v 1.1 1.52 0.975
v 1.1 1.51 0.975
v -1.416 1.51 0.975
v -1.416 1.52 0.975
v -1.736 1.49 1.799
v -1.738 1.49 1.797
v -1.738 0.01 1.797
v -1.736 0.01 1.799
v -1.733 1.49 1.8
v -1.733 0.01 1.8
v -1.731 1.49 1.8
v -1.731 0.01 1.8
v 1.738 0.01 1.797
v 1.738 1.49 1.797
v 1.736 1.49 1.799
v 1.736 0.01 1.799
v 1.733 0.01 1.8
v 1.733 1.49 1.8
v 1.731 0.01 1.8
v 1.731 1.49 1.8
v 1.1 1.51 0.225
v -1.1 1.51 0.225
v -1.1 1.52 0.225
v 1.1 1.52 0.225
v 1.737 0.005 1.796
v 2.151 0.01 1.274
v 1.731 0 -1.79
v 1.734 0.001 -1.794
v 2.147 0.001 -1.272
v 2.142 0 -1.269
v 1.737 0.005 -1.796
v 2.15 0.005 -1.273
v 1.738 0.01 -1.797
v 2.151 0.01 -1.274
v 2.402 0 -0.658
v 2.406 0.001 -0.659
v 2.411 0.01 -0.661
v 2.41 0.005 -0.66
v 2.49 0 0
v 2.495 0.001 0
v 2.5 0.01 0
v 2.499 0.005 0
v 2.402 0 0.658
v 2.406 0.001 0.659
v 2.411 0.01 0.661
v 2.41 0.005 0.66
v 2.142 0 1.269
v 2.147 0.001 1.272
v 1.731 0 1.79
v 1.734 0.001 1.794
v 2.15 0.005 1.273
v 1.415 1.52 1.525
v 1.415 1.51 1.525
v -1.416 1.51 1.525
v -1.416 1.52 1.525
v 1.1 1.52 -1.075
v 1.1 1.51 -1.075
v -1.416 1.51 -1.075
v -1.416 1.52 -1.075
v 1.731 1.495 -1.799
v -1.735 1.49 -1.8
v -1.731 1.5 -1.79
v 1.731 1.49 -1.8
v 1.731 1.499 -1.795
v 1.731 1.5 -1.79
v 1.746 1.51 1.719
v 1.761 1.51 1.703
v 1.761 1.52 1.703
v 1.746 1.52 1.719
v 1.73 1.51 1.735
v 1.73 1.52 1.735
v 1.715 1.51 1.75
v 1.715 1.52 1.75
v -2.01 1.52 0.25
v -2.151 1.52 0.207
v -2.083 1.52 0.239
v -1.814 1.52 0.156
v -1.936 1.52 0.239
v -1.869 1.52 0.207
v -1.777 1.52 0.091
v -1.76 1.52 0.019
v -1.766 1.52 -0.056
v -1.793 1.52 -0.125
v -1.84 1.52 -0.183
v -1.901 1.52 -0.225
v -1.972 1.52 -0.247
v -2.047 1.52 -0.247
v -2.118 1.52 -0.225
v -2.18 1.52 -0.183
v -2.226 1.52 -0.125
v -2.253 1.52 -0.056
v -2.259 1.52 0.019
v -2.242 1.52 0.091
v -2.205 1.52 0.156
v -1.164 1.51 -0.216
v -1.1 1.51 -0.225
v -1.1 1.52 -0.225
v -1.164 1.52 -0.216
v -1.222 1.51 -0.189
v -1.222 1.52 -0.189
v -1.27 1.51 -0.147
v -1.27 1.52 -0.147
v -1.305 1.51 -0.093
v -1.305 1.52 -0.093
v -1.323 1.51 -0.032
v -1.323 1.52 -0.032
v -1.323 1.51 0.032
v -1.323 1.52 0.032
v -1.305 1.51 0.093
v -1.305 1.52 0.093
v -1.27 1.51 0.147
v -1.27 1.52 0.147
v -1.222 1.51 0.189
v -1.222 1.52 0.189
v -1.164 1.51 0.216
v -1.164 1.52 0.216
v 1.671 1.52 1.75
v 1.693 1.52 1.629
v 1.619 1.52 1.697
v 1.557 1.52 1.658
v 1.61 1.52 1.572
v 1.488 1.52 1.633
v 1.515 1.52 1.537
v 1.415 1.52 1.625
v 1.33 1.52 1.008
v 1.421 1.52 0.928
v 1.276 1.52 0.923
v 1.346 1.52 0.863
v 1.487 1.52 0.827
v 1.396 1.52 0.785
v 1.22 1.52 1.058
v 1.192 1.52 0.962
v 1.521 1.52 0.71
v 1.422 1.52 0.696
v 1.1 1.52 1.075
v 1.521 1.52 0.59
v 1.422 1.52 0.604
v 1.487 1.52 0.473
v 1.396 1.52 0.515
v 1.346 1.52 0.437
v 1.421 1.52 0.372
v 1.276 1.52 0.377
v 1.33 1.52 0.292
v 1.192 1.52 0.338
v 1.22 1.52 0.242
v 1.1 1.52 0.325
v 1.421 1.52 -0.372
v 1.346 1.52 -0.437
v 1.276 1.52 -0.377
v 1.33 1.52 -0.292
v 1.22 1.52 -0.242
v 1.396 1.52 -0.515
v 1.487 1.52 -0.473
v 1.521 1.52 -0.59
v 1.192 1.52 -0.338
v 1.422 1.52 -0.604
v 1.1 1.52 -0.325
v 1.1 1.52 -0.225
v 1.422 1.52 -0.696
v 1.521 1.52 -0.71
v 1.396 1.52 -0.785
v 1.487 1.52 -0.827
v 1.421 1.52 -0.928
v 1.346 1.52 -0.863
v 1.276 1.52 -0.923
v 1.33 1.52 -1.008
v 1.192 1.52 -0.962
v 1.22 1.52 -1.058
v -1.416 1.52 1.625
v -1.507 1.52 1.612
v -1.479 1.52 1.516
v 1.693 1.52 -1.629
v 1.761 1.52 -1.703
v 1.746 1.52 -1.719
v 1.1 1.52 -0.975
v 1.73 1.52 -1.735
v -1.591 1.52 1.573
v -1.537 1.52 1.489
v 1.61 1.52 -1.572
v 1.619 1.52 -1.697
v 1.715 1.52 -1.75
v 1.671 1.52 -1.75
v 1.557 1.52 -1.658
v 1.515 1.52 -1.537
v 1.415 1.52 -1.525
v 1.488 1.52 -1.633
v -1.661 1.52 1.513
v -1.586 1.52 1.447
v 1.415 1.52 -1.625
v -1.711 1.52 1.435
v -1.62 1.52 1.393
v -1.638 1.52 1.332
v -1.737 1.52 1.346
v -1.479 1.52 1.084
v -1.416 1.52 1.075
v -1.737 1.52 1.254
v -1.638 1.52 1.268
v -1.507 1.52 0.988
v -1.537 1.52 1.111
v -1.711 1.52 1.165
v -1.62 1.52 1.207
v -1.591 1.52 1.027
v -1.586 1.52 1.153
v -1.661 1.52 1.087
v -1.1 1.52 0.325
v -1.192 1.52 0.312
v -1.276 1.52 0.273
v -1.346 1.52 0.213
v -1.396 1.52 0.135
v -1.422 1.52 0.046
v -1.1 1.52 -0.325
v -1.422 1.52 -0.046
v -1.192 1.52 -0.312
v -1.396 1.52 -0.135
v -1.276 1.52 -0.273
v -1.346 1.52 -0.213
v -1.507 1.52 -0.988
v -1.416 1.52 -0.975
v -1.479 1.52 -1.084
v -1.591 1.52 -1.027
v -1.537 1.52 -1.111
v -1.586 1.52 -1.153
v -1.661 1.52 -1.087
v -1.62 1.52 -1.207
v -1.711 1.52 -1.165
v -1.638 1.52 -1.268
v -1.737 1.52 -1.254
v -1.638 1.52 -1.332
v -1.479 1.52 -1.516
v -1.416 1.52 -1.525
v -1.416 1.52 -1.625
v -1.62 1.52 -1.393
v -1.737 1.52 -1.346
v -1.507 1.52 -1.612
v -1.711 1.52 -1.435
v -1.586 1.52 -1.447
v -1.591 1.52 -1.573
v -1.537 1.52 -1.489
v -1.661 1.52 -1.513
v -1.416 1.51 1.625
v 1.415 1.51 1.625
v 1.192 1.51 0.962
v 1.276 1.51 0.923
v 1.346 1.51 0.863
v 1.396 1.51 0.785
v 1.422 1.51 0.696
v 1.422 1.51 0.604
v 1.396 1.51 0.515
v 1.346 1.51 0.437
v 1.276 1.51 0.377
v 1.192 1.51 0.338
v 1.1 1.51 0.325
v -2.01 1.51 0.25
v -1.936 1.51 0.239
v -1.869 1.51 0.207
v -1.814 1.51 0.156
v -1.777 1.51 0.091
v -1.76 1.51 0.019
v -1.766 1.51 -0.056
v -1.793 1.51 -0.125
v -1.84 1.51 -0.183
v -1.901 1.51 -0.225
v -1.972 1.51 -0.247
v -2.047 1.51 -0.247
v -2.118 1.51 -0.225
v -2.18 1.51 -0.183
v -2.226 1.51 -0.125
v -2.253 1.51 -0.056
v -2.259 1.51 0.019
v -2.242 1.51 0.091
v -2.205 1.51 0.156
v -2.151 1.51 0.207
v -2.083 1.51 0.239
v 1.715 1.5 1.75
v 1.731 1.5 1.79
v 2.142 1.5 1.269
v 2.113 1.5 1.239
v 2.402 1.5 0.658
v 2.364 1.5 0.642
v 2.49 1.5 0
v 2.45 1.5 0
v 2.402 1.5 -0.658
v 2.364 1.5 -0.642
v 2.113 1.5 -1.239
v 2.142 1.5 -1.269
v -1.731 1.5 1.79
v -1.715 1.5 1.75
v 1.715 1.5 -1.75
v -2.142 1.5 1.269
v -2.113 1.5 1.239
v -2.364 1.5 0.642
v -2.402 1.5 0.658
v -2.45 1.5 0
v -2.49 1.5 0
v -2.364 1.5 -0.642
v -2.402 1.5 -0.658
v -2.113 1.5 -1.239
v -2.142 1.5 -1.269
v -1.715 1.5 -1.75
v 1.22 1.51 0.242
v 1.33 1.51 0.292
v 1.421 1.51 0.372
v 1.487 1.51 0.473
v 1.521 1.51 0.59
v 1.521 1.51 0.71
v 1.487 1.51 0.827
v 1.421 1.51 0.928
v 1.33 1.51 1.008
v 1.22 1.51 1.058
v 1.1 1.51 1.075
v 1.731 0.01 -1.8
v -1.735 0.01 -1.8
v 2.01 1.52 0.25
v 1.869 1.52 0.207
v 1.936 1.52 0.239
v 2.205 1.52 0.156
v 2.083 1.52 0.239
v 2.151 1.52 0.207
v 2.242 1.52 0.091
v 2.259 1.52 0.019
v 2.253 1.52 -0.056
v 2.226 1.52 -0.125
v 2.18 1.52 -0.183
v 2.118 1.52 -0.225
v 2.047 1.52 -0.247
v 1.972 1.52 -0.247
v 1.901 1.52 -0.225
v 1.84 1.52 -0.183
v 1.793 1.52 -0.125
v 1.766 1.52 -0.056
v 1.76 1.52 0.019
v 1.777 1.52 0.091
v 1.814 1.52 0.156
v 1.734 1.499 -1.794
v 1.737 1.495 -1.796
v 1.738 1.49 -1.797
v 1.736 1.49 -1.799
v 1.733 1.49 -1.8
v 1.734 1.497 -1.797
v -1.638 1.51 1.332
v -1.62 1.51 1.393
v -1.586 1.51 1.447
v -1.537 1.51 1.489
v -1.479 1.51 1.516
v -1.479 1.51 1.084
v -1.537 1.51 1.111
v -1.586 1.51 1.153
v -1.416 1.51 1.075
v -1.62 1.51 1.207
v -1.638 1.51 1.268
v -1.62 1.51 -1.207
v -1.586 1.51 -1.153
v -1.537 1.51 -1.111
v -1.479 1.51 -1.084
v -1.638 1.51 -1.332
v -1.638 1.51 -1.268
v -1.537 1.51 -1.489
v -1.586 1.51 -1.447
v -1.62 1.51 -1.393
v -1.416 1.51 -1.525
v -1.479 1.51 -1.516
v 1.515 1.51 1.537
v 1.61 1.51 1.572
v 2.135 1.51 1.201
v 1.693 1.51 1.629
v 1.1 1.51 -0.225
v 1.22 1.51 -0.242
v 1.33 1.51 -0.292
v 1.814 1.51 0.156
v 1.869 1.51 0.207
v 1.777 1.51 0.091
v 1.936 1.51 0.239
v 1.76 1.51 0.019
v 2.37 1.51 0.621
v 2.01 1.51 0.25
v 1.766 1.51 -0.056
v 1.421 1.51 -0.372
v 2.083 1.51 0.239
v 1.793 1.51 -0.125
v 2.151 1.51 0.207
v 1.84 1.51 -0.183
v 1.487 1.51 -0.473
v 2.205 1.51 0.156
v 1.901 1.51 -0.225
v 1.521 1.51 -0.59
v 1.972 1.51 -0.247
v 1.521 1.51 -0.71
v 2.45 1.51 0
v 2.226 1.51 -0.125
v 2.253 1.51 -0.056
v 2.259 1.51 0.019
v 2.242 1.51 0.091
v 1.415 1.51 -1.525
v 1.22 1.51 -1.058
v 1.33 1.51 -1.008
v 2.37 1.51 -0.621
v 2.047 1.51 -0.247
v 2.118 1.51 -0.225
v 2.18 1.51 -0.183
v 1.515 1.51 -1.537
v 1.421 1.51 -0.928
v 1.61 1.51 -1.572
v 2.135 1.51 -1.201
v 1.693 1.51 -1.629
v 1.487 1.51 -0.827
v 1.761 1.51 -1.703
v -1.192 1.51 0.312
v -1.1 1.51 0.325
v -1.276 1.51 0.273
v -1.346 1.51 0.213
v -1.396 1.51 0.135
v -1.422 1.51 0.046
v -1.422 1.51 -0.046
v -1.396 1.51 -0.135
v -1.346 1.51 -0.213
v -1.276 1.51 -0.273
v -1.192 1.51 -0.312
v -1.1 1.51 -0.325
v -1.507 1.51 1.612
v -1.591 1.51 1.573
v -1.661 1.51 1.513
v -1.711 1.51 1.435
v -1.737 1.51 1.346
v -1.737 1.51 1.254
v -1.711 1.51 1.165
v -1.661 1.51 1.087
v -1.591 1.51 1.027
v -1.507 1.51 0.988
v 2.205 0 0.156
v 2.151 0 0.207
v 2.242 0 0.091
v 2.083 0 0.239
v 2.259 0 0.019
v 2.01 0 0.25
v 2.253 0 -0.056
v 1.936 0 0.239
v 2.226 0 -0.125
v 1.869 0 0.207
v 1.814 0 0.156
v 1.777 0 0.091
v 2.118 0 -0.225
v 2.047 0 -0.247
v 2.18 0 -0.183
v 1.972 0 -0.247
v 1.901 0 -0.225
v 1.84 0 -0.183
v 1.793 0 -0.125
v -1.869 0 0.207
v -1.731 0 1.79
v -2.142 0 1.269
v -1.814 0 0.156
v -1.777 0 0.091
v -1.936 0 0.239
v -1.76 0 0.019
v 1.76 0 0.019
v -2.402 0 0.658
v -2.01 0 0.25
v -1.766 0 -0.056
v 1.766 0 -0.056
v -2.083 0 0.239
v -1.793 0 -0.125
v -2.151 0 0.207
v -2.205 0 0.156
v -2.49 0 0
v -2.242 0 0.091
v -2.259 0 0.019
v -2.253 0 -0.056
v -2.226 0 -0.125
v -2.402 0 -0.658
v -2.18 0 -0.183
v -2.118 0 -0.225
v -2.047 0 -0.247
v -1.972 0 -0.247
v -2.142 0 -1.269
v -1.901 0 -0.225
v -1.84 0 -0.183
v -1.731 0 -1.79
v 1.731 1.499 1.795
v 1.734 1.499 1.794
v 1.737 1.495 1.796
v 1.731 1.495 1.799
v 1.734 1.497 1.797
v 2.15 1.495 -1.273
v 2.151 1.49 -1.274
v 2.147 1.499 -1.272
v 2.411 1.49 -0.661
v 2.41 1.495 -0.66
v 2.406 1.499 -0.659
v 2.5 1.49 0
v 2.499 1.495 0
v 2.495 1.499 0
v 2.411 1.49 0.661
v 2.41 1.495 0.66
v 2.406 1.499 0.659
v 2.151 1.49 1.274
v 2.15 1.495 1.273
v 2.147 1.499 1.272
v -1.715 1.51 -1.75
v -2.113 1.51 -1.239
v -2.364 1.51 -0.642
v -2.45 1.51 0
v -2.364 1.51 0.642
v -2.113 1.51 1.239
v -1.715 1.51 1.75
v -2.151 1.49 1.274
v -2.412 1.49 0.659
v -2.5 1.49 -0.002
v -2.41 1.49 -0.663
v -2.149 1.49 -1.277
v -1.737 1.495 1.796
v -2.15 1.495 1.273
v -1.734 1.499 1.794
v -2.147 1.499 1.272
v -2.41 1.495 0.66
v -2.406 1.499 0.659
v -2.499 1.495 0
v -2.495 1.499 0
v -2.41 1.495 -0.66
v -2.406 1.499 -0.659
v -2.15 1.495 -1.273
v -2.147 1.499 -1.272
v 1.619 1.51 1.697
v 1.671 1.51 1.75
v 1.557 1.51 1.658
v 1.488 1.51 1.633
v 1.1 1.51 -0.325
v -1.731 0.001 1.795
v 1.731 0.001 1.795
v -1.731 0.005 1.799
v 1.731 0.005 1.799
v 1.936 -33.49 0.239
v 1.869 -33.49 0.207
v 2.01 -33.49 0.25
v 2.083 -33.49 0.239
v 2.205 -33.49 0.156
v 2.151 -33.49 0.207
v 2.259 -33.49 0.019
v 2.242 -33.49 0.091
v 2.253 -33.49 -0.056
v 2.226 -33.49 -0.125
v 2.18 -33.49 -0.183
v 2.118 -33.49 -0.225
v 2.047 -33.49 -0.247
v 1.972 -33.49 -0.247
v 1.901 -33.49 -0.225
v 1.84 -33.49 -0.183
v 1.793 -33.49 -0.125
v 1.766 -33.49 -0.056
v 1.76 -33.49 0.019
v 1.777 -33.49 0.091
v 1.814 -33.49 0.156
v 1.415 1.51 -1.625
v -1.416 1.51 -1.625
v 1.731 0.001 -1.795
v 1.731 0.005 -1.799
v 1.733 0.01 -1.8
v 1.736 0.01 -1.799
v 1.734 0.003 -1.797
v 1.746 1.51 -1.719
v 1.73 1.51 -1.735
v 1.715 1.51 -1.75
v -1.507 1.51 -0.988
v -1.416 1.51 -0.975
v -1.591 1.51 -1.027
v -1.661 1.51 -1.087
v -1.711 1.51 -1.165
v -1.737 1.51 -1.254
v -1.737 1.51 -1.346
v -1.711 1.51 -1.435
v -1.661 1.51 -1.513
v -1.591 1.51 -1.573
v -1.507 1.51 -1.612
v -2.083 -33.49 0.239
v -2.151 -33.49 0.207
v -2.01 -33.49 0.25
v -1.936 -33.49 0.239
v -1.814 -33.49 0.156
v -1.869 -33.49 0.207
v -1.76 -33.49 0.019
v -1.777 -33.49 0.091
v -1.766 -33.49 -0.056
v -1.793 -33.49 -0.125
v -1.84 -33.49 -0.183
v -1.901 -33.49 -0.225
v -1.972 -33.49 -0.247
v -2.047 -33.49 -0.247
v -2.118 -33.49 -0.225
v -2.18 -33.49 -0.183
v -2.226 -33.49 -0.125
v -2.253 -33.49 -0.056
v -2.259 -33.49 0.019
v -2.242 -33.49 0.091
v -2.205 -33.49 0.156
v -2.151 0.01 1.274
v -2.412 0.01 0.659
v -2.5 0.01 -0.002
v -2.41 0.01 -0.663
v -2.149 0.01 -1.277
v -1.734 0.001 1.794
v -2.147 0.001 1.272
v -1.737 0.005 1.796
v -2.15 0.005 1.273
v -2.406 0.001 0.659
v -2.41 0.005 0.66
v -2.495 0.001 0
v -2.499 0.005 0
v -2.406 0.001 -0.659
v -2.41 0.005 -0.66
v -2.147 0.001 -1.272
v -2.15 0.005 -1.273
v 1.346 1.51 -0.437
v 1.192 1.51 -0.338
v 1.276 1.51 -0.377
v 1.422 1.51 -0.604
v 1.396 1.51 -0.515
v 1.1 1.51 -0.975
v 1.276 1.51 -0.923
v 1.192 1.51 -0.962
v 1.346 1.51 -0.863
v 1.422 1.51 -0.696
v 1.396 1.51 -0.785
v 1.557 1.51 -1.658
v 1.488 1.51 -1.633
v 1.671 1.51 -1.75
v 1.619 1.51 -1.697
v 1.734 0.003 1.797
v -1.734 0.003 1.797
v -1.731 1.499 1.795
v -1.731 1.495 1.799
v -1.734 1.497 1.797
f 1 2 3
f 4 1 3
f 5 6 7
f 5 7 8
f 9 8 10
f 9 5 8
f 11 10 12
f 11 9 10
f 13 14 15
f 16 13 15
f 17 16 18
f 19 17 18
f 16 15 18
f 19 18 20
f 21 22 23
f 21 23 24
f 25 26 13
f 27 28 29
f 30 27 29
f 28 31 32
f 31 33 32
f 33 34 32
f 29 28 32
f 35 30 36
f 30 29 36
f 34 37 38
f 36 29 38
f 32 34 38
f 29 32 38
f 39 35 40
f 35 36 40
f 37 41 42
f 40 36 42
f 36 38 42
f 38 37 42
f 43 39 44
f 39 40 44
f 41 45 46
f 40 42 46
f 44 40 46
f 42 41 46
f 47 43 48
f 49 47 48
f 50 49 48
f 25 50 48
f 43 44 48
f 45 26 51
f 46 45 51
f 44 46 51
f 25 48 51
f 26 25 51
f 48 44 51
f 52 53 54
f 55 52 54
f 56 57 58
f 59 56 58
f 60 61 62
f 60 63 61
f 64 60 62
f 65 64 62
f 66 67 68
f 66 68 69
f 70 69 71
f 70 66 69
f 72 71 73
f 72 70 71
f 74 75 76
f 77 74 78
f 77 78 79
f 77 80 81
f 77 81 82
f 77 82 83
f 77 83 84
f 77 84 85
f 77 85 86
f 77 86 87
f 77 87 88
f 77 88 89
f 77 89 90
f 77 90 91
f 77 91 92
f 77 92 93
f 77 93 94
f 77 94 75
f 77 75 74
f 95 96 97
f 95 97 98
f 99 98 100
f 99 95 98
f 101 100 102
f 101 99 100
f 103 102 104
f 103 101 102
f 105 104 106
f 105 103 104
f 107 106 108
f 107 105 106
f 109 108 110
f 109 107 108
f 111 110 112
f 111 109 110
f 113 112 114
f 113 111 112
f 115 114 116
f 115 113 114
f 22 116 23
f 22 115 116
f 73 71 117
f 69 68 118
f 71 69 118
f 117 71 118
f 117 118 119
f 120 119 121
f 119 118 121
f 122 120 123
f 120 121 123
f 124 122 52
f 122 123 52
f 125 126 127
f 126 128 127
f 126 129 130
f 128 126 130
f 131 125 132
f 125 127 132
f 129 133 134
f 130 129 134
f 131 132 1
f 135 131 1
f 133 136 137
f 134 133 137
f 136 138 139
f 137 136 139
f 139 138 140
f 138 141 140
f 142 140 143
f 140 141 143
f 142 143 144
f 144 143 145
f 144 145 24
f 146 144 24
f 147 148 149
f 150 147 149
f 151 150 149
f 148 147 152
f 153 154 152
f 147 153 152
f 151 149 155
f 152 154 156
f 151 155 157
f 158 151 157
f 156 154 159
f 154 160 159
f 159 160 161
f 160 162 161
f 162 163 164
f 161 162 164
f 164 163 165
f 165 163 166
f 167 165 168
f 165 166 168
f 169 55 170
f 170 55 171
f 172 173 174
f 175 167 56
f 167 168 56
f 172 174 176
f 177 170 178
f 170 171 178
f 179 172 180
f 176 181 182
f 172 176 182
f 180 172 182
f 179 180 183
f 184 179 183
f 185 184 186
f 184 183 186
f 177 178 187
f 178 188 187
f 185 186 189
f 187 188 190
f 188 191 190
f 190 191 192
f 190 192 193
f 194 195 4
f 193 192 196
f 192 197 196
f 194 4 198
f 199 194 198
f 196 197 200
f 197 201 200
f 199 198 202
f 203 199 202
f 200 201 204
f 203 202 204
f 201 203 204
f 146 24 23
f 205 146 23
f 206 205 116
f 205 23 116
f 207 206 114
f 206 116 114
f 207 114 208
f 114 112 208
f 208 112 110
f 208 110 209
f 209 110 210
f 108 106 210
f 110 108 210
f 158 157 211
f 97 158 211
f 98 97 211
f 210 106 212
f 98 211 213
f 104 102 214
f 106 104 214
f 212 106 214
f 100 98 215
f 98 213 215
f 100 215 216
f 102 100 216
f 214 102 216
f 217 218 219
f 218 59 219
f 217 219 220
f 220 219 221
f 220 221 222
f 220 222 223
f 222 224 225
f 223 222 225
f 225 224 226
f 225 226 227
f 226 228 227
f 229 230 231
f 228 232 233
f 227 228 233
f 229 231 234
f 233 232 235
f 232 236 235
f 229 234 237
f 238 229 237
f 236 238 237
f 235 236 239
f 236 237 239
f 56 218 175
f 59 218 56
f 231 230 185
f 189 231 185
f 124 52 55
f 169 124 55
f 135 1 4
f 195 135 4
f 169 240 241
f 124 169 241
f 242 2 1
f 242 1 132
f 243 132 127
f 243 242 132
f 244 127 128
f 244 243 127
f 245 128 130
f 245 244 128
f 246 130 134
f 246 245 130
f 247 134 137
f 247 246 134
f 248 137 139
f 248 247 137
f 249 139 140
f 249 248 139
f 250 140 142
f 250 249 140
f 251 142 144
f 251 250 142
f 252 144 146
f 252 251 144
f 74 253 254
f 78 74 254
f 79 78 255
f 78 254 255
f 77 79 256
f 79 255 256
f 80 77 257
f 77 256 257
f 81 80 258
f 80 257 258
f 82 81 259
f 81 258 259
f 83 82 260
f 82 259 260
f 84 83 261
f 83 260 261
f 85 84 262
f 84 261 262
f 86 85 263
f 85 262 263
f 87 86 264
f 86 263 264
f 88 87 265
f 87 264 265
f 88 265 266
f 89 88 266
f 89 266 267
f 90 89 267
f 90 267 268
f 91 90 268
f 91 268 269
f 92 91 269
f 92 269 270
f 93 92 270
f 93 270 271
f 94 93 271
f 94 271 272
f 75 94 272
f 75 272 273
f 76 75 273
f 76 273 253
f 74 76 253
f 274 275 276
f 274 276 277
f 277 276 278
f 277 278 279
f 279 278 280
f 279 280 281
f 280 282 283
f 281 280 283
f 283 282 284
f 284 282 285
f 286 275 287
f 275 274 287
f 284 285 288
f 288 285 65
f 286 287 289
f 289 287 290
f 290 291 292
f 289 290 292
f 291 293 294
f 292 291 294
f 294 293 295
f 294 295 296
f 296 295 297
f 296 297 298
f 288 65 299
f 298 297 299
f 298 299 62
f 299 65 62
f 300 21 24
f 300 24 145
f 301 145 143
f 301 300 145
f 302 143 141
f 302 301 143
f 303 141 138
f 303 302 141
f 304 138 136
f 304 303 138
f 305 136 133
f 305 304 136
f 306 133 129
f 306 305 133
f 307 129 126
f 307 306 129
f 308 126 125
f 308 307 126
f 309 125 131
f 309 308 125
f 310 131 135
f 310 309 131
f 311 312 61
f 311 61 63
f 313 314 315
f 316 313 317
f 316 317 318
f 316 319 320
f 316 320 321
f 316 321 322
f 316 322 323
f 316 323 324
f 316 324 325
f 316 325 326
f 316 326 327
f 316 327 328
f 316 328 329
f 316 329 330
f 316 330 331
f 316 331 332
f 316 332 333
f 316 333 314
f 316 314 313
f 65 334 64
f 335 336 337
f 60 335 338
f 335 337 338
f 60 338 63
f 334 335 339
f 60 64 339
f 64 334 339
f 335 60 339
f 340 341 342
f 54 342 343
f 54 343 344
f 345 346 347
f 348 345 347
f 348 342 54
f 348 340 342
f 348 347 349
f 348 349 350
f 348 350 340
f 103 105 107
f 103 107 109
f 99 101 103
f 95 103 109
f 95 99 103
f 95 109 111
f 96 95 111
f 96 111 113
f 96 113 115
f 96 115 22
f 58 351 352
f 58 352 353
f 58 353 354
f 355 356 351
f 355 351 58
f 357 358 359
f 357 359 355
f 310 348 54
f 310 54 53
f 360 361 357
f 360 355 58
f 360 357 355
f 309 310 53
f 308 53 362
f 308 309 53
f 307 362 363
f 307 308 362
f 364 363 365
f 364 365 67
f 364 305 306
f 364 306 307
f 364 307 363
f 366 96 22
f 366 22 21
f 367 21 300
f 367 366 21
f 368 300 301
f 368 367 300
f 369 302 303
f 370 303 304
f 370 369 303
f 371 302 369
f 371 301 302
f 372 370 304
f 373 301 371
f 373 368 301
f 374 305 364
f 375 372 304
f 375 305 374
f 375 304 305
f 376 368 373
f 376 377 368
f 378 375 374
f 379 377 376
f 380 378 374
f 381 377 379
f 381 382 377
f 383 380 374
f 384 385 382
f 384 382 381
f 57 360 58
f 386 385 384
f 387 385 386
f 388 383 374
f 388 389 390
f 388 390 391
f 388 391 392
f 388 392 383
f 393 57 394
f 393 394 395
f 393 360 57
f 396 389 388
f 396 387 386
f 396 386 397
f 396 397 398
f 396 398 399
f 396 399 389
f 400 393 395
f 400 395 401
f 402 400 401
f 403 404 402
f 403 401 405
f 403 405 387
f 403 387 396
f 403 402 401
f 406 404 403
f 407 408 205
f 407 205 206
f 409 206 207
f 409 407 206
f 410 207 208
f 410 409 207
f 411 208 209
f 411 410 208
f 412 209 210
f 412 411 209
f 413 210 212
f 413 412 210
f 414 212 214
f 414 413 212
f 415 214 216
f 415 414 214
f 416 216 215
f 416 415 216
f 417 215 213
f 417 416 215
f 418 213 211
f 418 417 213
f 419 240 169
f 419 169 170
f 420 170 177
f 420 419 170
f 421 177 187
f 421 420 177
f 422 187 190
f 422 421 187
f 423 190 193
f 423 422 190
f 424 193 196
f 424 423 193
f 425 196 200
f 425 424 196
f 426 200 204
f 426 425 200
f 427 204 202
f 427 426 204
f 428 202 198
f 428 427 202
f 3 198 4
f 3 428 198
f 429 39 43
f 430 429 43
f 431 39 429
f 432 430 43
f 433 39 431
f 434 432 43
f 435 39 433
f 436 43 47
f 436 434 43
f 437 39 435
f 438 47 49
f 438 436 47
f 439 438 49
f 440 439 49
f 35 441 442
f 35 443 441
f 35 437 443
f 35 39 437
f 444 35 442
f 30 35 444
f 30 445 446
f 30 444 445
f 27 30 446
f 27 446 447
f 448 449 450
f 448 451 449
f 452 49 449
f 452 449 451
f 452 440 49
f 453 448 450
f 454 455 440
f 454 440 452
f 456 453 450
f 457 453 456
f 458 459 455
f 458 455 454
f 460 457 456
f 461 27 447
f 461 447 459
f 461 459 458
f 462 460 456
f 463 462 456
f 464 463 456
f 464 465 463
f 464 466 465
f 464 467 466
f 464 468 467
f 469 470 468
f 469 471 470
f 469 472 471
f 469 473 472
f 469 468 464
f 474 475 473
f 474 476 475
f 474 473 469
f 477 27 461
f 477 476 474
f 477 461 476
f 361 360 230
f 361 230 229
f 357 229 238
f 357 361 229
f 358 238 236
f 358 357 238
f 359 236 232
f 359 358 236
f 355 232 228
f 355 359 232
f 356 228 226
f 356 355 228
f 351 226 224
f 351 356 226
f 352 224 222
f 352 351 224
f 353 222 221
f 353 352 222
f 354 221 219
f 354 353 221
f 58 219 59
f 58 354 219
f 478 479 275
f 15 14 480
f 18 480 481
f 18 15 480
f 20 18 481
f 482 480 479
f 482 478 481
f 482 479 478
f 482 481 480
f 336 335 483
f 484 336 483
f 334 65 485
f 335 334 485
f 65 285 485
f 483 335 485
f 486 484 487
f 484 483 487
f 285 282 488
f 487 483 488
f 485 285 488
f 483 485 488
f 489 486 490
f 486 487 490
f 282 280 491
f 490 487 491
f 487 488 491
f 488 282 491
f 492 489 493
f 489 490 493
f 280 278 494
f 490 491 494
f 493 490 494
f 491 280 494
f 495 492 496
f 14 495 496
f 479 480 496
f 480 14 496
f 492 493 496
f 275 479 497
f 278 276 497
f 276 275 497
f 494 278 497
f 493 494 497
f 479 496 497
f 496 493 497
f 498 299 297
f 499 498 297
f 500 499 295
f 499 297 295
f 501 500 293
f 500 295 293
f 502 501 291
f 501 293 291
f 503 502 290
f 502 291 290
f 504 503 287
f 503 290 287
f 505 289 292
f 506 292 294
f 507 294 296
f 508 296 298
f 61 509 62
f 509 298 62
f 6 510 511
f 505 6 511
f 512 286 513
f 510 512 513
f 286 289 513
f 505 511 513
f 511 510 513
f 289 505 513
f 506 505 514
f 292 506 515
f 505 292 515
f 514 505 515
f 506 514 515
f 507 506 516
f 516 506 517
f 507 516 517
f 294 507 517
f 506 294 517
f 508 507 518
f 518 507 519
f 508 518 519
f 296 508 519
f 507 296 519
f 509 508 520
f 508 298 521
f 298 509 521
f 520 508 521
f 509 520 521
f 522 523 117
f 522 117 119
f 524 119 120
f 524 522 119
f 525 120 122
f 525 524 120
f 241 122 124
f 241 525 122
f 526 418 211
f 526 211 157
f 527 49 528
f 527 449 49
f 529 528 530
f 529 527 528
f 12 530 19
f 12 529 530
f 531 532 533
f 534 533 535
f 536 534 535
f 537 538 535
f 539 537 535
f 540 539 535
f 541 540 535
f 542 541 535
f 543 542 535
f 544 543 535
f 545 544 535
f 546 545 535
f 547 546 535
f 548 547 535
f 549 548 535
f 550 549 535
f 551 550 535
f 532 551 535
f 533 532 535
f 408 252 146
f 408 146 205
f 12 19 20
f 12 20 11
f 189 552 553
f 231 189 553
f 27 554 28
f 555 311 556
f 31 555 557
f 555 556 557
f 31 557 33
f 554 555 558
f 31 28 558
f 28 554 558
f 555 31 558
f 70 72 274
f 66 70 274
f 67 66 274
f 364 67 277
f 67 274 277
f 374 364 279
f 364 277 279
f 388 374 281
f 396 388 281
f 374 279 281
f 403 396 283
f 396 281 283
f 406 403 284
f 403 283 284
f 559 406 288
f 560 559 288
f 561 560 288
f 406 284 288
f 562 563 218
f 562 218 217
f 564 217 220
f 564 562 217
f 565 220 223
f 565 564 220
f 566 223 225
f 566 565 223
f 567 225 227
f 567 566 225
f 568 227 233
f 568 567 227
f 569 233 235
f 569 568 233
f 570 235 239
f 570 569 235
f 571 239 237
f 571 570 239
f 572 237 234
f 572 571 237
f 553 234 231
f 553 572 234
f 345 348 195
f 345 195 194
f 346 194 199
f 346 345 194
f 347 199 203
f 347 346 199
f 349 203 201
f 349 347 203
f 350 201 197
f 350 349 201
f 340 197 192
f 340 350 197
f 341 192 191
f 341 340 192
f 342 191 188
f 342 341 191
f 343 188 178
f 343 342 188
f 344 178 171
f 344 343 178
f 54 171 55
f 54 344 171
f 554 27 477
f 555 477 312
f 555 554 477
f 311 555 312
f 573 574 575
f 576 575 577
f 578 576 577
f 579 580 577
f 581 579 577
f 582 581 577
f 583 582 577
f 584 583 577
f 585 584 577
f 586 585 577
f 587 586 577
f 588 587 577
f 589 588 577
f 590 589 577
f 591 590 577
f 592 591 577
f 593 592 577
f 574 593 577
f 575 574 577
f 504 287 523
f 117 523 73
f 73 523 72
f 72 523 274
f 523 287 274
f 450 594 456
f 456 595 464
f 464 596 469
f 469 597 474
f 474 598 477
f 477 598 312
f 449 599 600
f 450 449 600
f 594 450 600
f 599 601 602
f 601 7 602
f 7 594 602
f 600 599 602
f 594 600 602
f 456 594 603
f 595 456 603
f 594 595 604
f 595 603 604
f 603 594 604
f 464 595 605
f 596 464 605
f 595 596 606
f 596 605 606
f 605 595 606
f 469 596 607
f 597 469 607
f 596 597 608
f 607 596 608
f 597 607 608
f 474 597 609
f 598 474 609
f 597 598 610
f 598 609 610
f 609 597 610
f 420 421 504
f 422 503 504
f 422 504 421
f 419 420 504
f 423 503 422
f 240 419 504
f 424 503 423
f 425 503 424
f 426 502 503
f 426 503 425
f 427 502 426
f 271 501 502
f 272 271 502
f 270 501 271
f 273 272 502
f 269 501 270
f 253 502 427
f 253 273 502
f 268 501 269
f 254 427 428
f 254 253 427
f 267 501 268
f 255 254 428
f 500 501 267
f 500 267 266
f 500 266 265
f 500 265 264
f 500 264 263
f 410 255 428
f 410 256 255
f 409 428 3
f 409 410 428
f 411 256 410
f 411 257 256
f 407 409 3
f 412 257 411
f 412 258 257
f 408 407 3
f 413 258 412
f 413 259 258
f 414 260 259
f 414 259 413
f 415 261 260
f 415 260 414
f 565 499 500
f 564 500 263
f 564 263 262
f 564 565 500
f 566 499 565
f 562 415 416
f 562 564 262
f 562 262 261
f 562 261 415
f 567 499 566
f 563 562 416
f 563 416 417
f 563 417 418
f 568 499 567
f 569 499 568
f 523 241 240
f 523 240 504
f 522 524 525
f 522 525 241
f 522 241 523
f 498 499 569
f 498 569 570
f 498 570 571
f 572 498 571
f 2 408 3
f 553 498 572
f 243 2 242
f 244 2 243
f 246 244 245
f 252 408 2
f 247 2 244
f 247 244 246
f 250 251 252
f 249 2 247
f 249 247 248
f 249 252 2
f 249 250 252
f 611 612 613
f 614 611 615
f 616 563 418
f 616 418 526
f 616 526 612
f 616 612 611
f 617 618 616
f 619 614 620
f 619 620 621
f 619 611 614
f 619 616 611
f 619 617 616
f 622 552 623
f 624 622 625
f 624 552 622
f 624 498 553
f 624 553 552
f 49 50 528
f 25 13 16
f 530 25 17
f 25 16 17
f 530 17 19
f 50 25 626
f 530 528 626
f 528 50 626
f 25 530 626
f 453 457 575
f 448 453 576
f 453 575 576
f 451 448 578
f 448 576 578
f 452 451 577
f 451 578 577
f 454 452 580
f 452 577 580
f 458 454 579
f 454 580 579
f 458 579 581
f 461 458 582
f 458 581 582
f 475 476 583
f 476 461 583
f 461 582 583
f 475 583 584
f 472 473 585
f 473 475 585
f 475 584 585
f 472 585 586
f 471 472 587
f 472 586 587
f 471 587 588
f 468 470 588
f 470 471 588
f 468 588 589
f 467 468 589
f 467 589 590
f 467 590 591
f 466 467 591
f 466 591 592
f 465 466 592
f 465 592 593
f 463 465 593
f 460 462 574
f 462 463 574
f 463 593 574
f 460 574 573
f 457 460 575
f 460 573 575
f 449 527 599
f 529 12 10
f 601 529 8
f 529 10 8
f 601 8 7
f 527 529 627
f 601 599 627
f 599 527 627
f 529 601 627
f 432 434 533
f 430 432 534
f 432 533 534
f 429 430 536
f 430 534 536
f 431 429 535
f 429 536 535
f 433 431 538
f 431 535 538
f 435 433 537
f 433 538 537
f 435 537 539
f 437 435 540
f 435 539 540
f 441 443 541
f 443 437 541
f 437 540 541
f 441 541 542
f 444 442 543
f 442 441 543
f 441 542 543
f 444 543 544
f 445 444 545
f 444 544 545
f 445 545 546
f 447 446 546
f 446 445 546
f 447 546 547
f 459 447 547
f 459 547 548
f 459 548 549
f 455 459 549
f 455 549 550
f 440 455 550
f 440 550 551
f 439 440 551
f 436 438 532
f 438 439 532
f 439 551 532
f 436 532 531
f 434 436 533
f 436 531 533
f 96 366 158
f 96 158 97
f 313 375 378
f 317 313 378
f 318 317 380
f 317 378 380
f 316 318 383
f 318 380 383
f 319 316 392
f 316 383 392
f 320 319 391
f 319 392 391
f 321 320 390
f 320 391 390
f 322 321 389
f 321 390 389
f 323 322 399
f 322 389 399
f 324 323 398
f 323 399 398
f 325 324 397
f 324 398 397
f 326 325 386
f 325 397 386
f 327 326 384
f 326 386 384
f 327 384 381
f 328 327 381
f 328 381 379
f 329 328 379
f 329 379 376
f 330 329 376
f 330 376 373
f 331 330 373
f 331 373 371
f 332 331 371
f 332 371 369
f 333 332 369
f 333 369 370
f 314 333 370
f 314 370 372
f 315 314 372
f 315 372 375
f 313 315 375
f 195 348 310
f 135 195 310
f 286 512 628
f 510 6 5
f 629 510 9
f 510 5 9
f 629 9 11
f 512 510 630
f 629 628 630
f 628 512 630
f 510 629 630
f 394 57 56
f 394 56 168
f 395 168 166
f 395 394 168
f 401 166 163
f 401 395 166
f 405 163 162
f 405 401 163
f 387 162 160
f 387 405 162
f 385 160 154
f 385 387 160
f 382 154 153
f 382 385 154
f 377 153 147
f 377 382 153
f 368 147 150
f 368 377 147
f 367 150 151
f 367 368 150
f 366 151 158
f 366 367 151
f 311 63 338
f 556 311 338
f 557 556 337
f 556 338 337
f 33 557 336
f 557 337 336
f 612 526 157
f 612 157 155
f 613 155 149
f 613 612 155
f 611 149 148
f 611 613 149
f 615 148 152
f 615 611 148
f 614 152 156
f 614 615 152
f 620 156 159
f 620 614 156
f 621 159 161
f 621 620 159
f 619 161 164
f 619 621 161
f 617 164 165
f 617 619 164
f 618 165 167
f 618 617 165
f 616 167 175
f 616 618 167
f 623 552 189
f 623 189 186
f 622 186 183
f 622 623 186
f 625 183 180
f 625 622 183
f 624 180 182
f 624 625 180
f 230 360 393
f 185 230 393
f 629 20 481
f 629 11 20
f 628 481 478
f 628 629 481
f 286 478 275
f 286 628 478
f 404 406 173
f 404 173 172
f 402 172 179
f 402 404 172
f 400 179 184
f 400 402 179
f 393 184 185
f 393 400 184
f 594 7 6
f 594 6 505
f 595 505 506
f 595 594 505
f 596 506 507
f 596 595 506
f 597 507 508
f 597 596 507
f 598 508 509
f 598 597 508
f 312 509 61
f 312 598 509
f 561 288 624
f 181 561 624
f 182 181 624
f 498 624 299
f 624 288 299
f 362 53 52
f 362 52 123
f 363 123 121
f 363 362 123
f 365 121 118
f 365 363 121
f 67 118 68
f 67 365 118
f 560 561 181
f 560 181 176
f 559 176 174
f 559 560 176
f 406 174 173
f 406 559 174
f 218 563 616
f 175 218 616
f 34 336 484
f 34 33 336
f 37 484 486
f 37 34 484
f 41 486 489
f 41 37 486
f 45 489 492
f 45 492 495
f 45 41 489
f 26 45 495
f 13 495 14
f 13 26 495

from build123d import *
from build123d.topology import SkipClean

# Parameters (mm, degrees)
BOSS_EXTRUDE1_DEPTH      = 1.5
BOSS_EXTRUDE2_DEPTH      = 0.01
BOSS_EXTRUDE3_DEPTH      = 0.01
BOSS_EXTRUDE4_DEPTH      = 0.01
BOSS_EXTRUDE4_DEPTH_BACK = 35
SKETCH4_R                = 0.25
FILLET1_R                = 0.01


with BuildPart() as part:
    # Sketch1 → Boss-Extrude1 (new body)
    with BuildSketch(Plane(origin=(0, 0, 0), x_dir=(1, 0, 0), z_dir=(0, 1, 0))):
        with BuildLine():
            Line((-1.734935157, 1.8), (1.734935157, 1.8))
            ThreePointArc((1.734935157, 1.8), (2.5, 0), (1.734935157, -1.8))
            Line((1.734935157, -1.8), (-1.734935157, -1.8))
            ThreePointArc((-1.734935157, -1.8), (-2.5, 0), (-1.734935157, 1.8))
        make_face()
    extrude(amount=BOSS_EXTRUDE1_DEPTH)

    # Sketch2 → Boss-Extrude2 (add)
    with BuildSketch(Plane(origin=(0, 1.5, 0), x_dir=(1, 0, 0), z_dir=(0, 1, 0))):
        with BuildLine():
            Line((-1.71464282, -1.75), (1.71464282, -1.75))
            ThreePointArc((1.71464282, -1.75), (2.45, 0), (1.71464282, 1.75))
            Line((1.71464282, 1.75), (-1.71464282, 1.75))
            ThreePointArc((-1.71464282, 1.75), (-2.45, 0), (-1.71464282, -1.75))
        make_face()
    extrude(amount=BOSS_EXTRUDE2_DEPTH)

    # Sketch3 → Boss-Extrude3 (add)
    with SkipClean():  # the faces are left unmerged after this step: merging them gives an invalid solid
        with BuildSketch(Plane(origin=(0, 1.51, 0), x_dir=(1, 0, 0), z_dir=(0, 1, 0))):
            with BuildLine():
                Line((-1.100223992, 0.325), (1.100223992, 0.325))
                ThreePointArc((1.100223992, 0.325), (1.425223992, 0.65), (1.100223992, 0.975))
                Line((1.100223992, 0.975), (-1.100223992, 0.975))
                Line((-1.100223992, 0.975), (-1.415621536, 0.975))
                ThreePointArc((-1.415621536, 0.975), (-1.740621536, 1.3), (-1.415621536, 1.625))
                Line((-1.415621536, 1.625), (1.100223992, 1.625))
                Line((1.100223992, 1.625), (1.414873992, 1.625))
                ThreePointArc((1.414873992, 1.625), (1.55739592, 1.657916964), (1.671047761, 1.75))
                Line((1.671047761, 1.75), (1.71464282, 1.75))
                ThreePointArc((1.71464282, 1.75), (1.737970537, 1.726834796), (1.760985316, 1.703358658))
                ThreePointArc((1.760985316, 1.703358658), (1.609556335, 1.572211984), (1.414873992, 1.525))
                Line((1.414873992, 1.525), (1.100223992, 1.525))
                Line((1.100223992, 1.525), (-1.415621536, 1.525))
                ThreePointArc((-1.415621536, 1.525), (-1.640621536, 1.3), (-1.415621536, 1.075))
                Line((-1.415621536, 1.075), (-1.100223992, 1.075))
                Line((-1.100223992, 1.075), (1.100223992, 1.075))
                ThreePointArc((1.100223992, 1.075), (1.525223992, 0.65), (1.100223992, 0.225))
                Line((1.100223992, 0.225), (-1.100223992, 0.225))
                ThreePointArc((-1.100223992, 0.225), (-1.325223992, 0), (-1.100223992, -0.225))
                Line((-1.100223992, -0.225), (1.100223992, -0.225))
                ThreePointArc((1.100223992, -0.225), (1.525223992, -0.65), (1.100223992, -1.075))
                Line((1.100223992, -1.075), (-1.100223992, -1.075))
                Line((-1.100223992, -1.075), (-1.415621536, -1.075))
                ThreePointArc((-1.415621536, -1.075), (-1.640621536, -1.3), (-1.415621536, -1.525))
                Line((-1.415621536, -1.525), (1.100223992, -1.525))
                Line((1.100223992, -1.525), (1.414873992, -1.525))
                ThreePointArc((1.414873992, -1.525), (1.609556335, -1.572211984), (1.760985316, -1.703358658))
                ThreePointArc((1.760985316, -1.703358658), (1.737970537, -1.726834796), (1.71464282, -1.75))
                Line((1.71464282, -1.75), (1.671047761, -1.75))
                ThreePointArc((1.671047761, -1.75), (1.55739592, -1.657916964), (1.414873992, -1.625))
                Line((1.414873992, -1.625), (1.100223992, -1.625))
                Line((1.100223992, -1.625), (-1.415621536, -1.625))
                ThreePointArc((-1.415621536, -1.625), (-1.740621536, -1.3), (-1.415621536, -0.975))
                Line((-1.415621536, -0.975), (-1.100223992, -0.975))
                Line((-1.100223992, -0.975), (1.100223992, -0.975))
                ThreePointArc((1.100223992, -0.975), (1.425223992, -0.65), (1.100223992, -0.325))
                Line((1.100223992, -0.325), (-1.100223992, -0.325))
                ThreePointArc((-1.100223992, -0.325), (-1.425223992, 0), (-1.100223992, 0.325))
            make_face()
        extrude(amount=BOSS_EXTRUDE3_DEPTH)

    # Sketch4 → Boss-Extrude4 (add, two sides: drawn at the far end of the back side and taken through both)
    with SkipClean():  # the faces are left unmerged after this step: merging them gives an invalid solid
        with BuildSketch(Plane(origin=(0, 1.51, 0), x_dir=(1, 0, 0), z_dir=(0, 1, 0)).offset(-BOSS_EXTRUDE4_DEPTH_BACK)):
            with Locations((-2.009742492, 0)):
                Circle(SKETCH4_R)
            with Locations((2.009742492, 0)):
                Circle(SKETCH4_R)
        extrude(amount=BOSS_EXTRUDE4_DEPTH + BOSS_EXTRUDE4_DEPTH_BACK)

    # Fillet1
    fillet1_edges = [part.edges().sort_by_distance(p)[0] for p in [
        (1.734935157, 0.75, -1.8),
        (0, 1.5, -1.8),
        (0, 0, -1.8),
        (2.5, 0, 0),
        (2.5, 1.5, 0),
        (1.734935157, 0.75, 1.8),
        (0, 0, 1.8),
        (0, 1.5, 1.8),
        (-1.734935157, 0.75, 1.8),
        (-2.5, 0, 0),
        (-2.5, 1.5, 0),
    ]]
    fillet(fillet1_edges, radius=FILLET1_R)


solid = part.part
